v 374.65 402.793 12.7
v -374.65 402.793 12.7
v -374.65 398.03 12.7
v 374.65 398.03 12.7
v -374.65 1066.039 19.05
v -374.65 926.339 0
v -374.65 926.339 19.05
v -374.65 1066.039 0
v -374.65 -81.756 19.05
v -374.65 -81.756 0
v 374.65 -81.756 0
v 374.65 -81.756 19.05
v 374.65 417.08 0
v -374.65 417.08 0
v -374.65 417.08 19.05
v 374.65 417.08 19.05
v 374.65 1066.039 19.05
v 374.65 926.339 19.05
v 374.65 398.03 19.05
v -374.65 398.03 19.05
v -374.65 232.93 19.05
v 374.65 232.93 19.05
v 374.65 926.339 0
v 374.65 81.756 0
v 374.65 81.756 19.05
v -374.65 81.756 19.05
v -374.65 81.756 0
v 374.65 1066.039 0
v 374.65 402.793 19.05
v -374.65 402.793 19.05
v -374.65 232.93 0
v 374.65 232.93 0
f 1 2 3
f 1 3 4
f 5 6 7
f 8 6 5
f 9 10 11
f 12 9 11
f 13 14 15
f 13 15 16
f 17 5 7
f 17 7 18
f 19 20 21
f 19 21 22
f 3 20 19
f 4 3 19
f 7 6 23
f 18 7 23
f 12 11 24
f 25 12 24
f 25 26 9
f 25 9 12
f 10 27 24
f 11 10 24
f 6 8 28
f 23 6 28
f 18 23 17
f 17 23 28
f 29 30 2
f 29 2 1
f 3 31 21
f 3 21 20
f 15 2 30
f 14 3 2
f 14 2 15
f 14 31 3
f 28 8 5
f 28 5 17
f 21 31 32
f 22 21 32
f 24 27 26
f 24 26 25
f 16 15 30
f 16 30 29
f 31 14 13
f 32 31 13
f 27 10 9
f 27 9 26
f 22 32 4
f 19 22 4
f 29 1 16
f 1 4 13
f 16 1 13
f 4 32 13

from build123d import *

# Parameters (mm, degrees)
F0_W     = 749.3
F0_H     = 163.5125
F1_DEPTH = 19.05
F2_W     = 749.3
F2_H     = 184.15
F3_DEPTH = 19.05
F4_W     = 749.3
F4_H     = 4.7625
F5_DEPTH = 6.35
F6_W     = 749.3
F6_H     = 139.7
F7_DEPTH = 19.05


with BuildPart() as f1:
    # F0 (on Top) → F1 (new body)
    with BuildSketch(Plane.XY):
        Rectangle(F0_W, F0_H)
    extrude(amount=F1_DEPTH)


with BuildPart() as f3:
    # F2 (on Top) → F3 (new body)
    with BuildSketch(Plane.XY):
        with Locations((0, 325.005321)):
            Rectangle(F2_W, F2_H)
    extrude(amount=F3_DEPTH)

    # F4 (on face) → F5 (cut)
    with BuildSketch(Plane.XY.offset(19.05)):
        with Locations((0, 400.411571)):
            Rectangle(F4_W, F4_H)
    extrude(amount=-F5_DEPTH, mode=Mode.SUBTRACT)


with BuildPart() as f7:
    # F6 (on Top) → F7 (new body)
    with BuildSketch(Plane.XY):
        with Locations((0, 996.189161)):
            Rectangle(F6_W, F6_H)
    extrude(amount=F7_DEPTH)


solid = Compound([f1.part, f3.part, f7.part])
